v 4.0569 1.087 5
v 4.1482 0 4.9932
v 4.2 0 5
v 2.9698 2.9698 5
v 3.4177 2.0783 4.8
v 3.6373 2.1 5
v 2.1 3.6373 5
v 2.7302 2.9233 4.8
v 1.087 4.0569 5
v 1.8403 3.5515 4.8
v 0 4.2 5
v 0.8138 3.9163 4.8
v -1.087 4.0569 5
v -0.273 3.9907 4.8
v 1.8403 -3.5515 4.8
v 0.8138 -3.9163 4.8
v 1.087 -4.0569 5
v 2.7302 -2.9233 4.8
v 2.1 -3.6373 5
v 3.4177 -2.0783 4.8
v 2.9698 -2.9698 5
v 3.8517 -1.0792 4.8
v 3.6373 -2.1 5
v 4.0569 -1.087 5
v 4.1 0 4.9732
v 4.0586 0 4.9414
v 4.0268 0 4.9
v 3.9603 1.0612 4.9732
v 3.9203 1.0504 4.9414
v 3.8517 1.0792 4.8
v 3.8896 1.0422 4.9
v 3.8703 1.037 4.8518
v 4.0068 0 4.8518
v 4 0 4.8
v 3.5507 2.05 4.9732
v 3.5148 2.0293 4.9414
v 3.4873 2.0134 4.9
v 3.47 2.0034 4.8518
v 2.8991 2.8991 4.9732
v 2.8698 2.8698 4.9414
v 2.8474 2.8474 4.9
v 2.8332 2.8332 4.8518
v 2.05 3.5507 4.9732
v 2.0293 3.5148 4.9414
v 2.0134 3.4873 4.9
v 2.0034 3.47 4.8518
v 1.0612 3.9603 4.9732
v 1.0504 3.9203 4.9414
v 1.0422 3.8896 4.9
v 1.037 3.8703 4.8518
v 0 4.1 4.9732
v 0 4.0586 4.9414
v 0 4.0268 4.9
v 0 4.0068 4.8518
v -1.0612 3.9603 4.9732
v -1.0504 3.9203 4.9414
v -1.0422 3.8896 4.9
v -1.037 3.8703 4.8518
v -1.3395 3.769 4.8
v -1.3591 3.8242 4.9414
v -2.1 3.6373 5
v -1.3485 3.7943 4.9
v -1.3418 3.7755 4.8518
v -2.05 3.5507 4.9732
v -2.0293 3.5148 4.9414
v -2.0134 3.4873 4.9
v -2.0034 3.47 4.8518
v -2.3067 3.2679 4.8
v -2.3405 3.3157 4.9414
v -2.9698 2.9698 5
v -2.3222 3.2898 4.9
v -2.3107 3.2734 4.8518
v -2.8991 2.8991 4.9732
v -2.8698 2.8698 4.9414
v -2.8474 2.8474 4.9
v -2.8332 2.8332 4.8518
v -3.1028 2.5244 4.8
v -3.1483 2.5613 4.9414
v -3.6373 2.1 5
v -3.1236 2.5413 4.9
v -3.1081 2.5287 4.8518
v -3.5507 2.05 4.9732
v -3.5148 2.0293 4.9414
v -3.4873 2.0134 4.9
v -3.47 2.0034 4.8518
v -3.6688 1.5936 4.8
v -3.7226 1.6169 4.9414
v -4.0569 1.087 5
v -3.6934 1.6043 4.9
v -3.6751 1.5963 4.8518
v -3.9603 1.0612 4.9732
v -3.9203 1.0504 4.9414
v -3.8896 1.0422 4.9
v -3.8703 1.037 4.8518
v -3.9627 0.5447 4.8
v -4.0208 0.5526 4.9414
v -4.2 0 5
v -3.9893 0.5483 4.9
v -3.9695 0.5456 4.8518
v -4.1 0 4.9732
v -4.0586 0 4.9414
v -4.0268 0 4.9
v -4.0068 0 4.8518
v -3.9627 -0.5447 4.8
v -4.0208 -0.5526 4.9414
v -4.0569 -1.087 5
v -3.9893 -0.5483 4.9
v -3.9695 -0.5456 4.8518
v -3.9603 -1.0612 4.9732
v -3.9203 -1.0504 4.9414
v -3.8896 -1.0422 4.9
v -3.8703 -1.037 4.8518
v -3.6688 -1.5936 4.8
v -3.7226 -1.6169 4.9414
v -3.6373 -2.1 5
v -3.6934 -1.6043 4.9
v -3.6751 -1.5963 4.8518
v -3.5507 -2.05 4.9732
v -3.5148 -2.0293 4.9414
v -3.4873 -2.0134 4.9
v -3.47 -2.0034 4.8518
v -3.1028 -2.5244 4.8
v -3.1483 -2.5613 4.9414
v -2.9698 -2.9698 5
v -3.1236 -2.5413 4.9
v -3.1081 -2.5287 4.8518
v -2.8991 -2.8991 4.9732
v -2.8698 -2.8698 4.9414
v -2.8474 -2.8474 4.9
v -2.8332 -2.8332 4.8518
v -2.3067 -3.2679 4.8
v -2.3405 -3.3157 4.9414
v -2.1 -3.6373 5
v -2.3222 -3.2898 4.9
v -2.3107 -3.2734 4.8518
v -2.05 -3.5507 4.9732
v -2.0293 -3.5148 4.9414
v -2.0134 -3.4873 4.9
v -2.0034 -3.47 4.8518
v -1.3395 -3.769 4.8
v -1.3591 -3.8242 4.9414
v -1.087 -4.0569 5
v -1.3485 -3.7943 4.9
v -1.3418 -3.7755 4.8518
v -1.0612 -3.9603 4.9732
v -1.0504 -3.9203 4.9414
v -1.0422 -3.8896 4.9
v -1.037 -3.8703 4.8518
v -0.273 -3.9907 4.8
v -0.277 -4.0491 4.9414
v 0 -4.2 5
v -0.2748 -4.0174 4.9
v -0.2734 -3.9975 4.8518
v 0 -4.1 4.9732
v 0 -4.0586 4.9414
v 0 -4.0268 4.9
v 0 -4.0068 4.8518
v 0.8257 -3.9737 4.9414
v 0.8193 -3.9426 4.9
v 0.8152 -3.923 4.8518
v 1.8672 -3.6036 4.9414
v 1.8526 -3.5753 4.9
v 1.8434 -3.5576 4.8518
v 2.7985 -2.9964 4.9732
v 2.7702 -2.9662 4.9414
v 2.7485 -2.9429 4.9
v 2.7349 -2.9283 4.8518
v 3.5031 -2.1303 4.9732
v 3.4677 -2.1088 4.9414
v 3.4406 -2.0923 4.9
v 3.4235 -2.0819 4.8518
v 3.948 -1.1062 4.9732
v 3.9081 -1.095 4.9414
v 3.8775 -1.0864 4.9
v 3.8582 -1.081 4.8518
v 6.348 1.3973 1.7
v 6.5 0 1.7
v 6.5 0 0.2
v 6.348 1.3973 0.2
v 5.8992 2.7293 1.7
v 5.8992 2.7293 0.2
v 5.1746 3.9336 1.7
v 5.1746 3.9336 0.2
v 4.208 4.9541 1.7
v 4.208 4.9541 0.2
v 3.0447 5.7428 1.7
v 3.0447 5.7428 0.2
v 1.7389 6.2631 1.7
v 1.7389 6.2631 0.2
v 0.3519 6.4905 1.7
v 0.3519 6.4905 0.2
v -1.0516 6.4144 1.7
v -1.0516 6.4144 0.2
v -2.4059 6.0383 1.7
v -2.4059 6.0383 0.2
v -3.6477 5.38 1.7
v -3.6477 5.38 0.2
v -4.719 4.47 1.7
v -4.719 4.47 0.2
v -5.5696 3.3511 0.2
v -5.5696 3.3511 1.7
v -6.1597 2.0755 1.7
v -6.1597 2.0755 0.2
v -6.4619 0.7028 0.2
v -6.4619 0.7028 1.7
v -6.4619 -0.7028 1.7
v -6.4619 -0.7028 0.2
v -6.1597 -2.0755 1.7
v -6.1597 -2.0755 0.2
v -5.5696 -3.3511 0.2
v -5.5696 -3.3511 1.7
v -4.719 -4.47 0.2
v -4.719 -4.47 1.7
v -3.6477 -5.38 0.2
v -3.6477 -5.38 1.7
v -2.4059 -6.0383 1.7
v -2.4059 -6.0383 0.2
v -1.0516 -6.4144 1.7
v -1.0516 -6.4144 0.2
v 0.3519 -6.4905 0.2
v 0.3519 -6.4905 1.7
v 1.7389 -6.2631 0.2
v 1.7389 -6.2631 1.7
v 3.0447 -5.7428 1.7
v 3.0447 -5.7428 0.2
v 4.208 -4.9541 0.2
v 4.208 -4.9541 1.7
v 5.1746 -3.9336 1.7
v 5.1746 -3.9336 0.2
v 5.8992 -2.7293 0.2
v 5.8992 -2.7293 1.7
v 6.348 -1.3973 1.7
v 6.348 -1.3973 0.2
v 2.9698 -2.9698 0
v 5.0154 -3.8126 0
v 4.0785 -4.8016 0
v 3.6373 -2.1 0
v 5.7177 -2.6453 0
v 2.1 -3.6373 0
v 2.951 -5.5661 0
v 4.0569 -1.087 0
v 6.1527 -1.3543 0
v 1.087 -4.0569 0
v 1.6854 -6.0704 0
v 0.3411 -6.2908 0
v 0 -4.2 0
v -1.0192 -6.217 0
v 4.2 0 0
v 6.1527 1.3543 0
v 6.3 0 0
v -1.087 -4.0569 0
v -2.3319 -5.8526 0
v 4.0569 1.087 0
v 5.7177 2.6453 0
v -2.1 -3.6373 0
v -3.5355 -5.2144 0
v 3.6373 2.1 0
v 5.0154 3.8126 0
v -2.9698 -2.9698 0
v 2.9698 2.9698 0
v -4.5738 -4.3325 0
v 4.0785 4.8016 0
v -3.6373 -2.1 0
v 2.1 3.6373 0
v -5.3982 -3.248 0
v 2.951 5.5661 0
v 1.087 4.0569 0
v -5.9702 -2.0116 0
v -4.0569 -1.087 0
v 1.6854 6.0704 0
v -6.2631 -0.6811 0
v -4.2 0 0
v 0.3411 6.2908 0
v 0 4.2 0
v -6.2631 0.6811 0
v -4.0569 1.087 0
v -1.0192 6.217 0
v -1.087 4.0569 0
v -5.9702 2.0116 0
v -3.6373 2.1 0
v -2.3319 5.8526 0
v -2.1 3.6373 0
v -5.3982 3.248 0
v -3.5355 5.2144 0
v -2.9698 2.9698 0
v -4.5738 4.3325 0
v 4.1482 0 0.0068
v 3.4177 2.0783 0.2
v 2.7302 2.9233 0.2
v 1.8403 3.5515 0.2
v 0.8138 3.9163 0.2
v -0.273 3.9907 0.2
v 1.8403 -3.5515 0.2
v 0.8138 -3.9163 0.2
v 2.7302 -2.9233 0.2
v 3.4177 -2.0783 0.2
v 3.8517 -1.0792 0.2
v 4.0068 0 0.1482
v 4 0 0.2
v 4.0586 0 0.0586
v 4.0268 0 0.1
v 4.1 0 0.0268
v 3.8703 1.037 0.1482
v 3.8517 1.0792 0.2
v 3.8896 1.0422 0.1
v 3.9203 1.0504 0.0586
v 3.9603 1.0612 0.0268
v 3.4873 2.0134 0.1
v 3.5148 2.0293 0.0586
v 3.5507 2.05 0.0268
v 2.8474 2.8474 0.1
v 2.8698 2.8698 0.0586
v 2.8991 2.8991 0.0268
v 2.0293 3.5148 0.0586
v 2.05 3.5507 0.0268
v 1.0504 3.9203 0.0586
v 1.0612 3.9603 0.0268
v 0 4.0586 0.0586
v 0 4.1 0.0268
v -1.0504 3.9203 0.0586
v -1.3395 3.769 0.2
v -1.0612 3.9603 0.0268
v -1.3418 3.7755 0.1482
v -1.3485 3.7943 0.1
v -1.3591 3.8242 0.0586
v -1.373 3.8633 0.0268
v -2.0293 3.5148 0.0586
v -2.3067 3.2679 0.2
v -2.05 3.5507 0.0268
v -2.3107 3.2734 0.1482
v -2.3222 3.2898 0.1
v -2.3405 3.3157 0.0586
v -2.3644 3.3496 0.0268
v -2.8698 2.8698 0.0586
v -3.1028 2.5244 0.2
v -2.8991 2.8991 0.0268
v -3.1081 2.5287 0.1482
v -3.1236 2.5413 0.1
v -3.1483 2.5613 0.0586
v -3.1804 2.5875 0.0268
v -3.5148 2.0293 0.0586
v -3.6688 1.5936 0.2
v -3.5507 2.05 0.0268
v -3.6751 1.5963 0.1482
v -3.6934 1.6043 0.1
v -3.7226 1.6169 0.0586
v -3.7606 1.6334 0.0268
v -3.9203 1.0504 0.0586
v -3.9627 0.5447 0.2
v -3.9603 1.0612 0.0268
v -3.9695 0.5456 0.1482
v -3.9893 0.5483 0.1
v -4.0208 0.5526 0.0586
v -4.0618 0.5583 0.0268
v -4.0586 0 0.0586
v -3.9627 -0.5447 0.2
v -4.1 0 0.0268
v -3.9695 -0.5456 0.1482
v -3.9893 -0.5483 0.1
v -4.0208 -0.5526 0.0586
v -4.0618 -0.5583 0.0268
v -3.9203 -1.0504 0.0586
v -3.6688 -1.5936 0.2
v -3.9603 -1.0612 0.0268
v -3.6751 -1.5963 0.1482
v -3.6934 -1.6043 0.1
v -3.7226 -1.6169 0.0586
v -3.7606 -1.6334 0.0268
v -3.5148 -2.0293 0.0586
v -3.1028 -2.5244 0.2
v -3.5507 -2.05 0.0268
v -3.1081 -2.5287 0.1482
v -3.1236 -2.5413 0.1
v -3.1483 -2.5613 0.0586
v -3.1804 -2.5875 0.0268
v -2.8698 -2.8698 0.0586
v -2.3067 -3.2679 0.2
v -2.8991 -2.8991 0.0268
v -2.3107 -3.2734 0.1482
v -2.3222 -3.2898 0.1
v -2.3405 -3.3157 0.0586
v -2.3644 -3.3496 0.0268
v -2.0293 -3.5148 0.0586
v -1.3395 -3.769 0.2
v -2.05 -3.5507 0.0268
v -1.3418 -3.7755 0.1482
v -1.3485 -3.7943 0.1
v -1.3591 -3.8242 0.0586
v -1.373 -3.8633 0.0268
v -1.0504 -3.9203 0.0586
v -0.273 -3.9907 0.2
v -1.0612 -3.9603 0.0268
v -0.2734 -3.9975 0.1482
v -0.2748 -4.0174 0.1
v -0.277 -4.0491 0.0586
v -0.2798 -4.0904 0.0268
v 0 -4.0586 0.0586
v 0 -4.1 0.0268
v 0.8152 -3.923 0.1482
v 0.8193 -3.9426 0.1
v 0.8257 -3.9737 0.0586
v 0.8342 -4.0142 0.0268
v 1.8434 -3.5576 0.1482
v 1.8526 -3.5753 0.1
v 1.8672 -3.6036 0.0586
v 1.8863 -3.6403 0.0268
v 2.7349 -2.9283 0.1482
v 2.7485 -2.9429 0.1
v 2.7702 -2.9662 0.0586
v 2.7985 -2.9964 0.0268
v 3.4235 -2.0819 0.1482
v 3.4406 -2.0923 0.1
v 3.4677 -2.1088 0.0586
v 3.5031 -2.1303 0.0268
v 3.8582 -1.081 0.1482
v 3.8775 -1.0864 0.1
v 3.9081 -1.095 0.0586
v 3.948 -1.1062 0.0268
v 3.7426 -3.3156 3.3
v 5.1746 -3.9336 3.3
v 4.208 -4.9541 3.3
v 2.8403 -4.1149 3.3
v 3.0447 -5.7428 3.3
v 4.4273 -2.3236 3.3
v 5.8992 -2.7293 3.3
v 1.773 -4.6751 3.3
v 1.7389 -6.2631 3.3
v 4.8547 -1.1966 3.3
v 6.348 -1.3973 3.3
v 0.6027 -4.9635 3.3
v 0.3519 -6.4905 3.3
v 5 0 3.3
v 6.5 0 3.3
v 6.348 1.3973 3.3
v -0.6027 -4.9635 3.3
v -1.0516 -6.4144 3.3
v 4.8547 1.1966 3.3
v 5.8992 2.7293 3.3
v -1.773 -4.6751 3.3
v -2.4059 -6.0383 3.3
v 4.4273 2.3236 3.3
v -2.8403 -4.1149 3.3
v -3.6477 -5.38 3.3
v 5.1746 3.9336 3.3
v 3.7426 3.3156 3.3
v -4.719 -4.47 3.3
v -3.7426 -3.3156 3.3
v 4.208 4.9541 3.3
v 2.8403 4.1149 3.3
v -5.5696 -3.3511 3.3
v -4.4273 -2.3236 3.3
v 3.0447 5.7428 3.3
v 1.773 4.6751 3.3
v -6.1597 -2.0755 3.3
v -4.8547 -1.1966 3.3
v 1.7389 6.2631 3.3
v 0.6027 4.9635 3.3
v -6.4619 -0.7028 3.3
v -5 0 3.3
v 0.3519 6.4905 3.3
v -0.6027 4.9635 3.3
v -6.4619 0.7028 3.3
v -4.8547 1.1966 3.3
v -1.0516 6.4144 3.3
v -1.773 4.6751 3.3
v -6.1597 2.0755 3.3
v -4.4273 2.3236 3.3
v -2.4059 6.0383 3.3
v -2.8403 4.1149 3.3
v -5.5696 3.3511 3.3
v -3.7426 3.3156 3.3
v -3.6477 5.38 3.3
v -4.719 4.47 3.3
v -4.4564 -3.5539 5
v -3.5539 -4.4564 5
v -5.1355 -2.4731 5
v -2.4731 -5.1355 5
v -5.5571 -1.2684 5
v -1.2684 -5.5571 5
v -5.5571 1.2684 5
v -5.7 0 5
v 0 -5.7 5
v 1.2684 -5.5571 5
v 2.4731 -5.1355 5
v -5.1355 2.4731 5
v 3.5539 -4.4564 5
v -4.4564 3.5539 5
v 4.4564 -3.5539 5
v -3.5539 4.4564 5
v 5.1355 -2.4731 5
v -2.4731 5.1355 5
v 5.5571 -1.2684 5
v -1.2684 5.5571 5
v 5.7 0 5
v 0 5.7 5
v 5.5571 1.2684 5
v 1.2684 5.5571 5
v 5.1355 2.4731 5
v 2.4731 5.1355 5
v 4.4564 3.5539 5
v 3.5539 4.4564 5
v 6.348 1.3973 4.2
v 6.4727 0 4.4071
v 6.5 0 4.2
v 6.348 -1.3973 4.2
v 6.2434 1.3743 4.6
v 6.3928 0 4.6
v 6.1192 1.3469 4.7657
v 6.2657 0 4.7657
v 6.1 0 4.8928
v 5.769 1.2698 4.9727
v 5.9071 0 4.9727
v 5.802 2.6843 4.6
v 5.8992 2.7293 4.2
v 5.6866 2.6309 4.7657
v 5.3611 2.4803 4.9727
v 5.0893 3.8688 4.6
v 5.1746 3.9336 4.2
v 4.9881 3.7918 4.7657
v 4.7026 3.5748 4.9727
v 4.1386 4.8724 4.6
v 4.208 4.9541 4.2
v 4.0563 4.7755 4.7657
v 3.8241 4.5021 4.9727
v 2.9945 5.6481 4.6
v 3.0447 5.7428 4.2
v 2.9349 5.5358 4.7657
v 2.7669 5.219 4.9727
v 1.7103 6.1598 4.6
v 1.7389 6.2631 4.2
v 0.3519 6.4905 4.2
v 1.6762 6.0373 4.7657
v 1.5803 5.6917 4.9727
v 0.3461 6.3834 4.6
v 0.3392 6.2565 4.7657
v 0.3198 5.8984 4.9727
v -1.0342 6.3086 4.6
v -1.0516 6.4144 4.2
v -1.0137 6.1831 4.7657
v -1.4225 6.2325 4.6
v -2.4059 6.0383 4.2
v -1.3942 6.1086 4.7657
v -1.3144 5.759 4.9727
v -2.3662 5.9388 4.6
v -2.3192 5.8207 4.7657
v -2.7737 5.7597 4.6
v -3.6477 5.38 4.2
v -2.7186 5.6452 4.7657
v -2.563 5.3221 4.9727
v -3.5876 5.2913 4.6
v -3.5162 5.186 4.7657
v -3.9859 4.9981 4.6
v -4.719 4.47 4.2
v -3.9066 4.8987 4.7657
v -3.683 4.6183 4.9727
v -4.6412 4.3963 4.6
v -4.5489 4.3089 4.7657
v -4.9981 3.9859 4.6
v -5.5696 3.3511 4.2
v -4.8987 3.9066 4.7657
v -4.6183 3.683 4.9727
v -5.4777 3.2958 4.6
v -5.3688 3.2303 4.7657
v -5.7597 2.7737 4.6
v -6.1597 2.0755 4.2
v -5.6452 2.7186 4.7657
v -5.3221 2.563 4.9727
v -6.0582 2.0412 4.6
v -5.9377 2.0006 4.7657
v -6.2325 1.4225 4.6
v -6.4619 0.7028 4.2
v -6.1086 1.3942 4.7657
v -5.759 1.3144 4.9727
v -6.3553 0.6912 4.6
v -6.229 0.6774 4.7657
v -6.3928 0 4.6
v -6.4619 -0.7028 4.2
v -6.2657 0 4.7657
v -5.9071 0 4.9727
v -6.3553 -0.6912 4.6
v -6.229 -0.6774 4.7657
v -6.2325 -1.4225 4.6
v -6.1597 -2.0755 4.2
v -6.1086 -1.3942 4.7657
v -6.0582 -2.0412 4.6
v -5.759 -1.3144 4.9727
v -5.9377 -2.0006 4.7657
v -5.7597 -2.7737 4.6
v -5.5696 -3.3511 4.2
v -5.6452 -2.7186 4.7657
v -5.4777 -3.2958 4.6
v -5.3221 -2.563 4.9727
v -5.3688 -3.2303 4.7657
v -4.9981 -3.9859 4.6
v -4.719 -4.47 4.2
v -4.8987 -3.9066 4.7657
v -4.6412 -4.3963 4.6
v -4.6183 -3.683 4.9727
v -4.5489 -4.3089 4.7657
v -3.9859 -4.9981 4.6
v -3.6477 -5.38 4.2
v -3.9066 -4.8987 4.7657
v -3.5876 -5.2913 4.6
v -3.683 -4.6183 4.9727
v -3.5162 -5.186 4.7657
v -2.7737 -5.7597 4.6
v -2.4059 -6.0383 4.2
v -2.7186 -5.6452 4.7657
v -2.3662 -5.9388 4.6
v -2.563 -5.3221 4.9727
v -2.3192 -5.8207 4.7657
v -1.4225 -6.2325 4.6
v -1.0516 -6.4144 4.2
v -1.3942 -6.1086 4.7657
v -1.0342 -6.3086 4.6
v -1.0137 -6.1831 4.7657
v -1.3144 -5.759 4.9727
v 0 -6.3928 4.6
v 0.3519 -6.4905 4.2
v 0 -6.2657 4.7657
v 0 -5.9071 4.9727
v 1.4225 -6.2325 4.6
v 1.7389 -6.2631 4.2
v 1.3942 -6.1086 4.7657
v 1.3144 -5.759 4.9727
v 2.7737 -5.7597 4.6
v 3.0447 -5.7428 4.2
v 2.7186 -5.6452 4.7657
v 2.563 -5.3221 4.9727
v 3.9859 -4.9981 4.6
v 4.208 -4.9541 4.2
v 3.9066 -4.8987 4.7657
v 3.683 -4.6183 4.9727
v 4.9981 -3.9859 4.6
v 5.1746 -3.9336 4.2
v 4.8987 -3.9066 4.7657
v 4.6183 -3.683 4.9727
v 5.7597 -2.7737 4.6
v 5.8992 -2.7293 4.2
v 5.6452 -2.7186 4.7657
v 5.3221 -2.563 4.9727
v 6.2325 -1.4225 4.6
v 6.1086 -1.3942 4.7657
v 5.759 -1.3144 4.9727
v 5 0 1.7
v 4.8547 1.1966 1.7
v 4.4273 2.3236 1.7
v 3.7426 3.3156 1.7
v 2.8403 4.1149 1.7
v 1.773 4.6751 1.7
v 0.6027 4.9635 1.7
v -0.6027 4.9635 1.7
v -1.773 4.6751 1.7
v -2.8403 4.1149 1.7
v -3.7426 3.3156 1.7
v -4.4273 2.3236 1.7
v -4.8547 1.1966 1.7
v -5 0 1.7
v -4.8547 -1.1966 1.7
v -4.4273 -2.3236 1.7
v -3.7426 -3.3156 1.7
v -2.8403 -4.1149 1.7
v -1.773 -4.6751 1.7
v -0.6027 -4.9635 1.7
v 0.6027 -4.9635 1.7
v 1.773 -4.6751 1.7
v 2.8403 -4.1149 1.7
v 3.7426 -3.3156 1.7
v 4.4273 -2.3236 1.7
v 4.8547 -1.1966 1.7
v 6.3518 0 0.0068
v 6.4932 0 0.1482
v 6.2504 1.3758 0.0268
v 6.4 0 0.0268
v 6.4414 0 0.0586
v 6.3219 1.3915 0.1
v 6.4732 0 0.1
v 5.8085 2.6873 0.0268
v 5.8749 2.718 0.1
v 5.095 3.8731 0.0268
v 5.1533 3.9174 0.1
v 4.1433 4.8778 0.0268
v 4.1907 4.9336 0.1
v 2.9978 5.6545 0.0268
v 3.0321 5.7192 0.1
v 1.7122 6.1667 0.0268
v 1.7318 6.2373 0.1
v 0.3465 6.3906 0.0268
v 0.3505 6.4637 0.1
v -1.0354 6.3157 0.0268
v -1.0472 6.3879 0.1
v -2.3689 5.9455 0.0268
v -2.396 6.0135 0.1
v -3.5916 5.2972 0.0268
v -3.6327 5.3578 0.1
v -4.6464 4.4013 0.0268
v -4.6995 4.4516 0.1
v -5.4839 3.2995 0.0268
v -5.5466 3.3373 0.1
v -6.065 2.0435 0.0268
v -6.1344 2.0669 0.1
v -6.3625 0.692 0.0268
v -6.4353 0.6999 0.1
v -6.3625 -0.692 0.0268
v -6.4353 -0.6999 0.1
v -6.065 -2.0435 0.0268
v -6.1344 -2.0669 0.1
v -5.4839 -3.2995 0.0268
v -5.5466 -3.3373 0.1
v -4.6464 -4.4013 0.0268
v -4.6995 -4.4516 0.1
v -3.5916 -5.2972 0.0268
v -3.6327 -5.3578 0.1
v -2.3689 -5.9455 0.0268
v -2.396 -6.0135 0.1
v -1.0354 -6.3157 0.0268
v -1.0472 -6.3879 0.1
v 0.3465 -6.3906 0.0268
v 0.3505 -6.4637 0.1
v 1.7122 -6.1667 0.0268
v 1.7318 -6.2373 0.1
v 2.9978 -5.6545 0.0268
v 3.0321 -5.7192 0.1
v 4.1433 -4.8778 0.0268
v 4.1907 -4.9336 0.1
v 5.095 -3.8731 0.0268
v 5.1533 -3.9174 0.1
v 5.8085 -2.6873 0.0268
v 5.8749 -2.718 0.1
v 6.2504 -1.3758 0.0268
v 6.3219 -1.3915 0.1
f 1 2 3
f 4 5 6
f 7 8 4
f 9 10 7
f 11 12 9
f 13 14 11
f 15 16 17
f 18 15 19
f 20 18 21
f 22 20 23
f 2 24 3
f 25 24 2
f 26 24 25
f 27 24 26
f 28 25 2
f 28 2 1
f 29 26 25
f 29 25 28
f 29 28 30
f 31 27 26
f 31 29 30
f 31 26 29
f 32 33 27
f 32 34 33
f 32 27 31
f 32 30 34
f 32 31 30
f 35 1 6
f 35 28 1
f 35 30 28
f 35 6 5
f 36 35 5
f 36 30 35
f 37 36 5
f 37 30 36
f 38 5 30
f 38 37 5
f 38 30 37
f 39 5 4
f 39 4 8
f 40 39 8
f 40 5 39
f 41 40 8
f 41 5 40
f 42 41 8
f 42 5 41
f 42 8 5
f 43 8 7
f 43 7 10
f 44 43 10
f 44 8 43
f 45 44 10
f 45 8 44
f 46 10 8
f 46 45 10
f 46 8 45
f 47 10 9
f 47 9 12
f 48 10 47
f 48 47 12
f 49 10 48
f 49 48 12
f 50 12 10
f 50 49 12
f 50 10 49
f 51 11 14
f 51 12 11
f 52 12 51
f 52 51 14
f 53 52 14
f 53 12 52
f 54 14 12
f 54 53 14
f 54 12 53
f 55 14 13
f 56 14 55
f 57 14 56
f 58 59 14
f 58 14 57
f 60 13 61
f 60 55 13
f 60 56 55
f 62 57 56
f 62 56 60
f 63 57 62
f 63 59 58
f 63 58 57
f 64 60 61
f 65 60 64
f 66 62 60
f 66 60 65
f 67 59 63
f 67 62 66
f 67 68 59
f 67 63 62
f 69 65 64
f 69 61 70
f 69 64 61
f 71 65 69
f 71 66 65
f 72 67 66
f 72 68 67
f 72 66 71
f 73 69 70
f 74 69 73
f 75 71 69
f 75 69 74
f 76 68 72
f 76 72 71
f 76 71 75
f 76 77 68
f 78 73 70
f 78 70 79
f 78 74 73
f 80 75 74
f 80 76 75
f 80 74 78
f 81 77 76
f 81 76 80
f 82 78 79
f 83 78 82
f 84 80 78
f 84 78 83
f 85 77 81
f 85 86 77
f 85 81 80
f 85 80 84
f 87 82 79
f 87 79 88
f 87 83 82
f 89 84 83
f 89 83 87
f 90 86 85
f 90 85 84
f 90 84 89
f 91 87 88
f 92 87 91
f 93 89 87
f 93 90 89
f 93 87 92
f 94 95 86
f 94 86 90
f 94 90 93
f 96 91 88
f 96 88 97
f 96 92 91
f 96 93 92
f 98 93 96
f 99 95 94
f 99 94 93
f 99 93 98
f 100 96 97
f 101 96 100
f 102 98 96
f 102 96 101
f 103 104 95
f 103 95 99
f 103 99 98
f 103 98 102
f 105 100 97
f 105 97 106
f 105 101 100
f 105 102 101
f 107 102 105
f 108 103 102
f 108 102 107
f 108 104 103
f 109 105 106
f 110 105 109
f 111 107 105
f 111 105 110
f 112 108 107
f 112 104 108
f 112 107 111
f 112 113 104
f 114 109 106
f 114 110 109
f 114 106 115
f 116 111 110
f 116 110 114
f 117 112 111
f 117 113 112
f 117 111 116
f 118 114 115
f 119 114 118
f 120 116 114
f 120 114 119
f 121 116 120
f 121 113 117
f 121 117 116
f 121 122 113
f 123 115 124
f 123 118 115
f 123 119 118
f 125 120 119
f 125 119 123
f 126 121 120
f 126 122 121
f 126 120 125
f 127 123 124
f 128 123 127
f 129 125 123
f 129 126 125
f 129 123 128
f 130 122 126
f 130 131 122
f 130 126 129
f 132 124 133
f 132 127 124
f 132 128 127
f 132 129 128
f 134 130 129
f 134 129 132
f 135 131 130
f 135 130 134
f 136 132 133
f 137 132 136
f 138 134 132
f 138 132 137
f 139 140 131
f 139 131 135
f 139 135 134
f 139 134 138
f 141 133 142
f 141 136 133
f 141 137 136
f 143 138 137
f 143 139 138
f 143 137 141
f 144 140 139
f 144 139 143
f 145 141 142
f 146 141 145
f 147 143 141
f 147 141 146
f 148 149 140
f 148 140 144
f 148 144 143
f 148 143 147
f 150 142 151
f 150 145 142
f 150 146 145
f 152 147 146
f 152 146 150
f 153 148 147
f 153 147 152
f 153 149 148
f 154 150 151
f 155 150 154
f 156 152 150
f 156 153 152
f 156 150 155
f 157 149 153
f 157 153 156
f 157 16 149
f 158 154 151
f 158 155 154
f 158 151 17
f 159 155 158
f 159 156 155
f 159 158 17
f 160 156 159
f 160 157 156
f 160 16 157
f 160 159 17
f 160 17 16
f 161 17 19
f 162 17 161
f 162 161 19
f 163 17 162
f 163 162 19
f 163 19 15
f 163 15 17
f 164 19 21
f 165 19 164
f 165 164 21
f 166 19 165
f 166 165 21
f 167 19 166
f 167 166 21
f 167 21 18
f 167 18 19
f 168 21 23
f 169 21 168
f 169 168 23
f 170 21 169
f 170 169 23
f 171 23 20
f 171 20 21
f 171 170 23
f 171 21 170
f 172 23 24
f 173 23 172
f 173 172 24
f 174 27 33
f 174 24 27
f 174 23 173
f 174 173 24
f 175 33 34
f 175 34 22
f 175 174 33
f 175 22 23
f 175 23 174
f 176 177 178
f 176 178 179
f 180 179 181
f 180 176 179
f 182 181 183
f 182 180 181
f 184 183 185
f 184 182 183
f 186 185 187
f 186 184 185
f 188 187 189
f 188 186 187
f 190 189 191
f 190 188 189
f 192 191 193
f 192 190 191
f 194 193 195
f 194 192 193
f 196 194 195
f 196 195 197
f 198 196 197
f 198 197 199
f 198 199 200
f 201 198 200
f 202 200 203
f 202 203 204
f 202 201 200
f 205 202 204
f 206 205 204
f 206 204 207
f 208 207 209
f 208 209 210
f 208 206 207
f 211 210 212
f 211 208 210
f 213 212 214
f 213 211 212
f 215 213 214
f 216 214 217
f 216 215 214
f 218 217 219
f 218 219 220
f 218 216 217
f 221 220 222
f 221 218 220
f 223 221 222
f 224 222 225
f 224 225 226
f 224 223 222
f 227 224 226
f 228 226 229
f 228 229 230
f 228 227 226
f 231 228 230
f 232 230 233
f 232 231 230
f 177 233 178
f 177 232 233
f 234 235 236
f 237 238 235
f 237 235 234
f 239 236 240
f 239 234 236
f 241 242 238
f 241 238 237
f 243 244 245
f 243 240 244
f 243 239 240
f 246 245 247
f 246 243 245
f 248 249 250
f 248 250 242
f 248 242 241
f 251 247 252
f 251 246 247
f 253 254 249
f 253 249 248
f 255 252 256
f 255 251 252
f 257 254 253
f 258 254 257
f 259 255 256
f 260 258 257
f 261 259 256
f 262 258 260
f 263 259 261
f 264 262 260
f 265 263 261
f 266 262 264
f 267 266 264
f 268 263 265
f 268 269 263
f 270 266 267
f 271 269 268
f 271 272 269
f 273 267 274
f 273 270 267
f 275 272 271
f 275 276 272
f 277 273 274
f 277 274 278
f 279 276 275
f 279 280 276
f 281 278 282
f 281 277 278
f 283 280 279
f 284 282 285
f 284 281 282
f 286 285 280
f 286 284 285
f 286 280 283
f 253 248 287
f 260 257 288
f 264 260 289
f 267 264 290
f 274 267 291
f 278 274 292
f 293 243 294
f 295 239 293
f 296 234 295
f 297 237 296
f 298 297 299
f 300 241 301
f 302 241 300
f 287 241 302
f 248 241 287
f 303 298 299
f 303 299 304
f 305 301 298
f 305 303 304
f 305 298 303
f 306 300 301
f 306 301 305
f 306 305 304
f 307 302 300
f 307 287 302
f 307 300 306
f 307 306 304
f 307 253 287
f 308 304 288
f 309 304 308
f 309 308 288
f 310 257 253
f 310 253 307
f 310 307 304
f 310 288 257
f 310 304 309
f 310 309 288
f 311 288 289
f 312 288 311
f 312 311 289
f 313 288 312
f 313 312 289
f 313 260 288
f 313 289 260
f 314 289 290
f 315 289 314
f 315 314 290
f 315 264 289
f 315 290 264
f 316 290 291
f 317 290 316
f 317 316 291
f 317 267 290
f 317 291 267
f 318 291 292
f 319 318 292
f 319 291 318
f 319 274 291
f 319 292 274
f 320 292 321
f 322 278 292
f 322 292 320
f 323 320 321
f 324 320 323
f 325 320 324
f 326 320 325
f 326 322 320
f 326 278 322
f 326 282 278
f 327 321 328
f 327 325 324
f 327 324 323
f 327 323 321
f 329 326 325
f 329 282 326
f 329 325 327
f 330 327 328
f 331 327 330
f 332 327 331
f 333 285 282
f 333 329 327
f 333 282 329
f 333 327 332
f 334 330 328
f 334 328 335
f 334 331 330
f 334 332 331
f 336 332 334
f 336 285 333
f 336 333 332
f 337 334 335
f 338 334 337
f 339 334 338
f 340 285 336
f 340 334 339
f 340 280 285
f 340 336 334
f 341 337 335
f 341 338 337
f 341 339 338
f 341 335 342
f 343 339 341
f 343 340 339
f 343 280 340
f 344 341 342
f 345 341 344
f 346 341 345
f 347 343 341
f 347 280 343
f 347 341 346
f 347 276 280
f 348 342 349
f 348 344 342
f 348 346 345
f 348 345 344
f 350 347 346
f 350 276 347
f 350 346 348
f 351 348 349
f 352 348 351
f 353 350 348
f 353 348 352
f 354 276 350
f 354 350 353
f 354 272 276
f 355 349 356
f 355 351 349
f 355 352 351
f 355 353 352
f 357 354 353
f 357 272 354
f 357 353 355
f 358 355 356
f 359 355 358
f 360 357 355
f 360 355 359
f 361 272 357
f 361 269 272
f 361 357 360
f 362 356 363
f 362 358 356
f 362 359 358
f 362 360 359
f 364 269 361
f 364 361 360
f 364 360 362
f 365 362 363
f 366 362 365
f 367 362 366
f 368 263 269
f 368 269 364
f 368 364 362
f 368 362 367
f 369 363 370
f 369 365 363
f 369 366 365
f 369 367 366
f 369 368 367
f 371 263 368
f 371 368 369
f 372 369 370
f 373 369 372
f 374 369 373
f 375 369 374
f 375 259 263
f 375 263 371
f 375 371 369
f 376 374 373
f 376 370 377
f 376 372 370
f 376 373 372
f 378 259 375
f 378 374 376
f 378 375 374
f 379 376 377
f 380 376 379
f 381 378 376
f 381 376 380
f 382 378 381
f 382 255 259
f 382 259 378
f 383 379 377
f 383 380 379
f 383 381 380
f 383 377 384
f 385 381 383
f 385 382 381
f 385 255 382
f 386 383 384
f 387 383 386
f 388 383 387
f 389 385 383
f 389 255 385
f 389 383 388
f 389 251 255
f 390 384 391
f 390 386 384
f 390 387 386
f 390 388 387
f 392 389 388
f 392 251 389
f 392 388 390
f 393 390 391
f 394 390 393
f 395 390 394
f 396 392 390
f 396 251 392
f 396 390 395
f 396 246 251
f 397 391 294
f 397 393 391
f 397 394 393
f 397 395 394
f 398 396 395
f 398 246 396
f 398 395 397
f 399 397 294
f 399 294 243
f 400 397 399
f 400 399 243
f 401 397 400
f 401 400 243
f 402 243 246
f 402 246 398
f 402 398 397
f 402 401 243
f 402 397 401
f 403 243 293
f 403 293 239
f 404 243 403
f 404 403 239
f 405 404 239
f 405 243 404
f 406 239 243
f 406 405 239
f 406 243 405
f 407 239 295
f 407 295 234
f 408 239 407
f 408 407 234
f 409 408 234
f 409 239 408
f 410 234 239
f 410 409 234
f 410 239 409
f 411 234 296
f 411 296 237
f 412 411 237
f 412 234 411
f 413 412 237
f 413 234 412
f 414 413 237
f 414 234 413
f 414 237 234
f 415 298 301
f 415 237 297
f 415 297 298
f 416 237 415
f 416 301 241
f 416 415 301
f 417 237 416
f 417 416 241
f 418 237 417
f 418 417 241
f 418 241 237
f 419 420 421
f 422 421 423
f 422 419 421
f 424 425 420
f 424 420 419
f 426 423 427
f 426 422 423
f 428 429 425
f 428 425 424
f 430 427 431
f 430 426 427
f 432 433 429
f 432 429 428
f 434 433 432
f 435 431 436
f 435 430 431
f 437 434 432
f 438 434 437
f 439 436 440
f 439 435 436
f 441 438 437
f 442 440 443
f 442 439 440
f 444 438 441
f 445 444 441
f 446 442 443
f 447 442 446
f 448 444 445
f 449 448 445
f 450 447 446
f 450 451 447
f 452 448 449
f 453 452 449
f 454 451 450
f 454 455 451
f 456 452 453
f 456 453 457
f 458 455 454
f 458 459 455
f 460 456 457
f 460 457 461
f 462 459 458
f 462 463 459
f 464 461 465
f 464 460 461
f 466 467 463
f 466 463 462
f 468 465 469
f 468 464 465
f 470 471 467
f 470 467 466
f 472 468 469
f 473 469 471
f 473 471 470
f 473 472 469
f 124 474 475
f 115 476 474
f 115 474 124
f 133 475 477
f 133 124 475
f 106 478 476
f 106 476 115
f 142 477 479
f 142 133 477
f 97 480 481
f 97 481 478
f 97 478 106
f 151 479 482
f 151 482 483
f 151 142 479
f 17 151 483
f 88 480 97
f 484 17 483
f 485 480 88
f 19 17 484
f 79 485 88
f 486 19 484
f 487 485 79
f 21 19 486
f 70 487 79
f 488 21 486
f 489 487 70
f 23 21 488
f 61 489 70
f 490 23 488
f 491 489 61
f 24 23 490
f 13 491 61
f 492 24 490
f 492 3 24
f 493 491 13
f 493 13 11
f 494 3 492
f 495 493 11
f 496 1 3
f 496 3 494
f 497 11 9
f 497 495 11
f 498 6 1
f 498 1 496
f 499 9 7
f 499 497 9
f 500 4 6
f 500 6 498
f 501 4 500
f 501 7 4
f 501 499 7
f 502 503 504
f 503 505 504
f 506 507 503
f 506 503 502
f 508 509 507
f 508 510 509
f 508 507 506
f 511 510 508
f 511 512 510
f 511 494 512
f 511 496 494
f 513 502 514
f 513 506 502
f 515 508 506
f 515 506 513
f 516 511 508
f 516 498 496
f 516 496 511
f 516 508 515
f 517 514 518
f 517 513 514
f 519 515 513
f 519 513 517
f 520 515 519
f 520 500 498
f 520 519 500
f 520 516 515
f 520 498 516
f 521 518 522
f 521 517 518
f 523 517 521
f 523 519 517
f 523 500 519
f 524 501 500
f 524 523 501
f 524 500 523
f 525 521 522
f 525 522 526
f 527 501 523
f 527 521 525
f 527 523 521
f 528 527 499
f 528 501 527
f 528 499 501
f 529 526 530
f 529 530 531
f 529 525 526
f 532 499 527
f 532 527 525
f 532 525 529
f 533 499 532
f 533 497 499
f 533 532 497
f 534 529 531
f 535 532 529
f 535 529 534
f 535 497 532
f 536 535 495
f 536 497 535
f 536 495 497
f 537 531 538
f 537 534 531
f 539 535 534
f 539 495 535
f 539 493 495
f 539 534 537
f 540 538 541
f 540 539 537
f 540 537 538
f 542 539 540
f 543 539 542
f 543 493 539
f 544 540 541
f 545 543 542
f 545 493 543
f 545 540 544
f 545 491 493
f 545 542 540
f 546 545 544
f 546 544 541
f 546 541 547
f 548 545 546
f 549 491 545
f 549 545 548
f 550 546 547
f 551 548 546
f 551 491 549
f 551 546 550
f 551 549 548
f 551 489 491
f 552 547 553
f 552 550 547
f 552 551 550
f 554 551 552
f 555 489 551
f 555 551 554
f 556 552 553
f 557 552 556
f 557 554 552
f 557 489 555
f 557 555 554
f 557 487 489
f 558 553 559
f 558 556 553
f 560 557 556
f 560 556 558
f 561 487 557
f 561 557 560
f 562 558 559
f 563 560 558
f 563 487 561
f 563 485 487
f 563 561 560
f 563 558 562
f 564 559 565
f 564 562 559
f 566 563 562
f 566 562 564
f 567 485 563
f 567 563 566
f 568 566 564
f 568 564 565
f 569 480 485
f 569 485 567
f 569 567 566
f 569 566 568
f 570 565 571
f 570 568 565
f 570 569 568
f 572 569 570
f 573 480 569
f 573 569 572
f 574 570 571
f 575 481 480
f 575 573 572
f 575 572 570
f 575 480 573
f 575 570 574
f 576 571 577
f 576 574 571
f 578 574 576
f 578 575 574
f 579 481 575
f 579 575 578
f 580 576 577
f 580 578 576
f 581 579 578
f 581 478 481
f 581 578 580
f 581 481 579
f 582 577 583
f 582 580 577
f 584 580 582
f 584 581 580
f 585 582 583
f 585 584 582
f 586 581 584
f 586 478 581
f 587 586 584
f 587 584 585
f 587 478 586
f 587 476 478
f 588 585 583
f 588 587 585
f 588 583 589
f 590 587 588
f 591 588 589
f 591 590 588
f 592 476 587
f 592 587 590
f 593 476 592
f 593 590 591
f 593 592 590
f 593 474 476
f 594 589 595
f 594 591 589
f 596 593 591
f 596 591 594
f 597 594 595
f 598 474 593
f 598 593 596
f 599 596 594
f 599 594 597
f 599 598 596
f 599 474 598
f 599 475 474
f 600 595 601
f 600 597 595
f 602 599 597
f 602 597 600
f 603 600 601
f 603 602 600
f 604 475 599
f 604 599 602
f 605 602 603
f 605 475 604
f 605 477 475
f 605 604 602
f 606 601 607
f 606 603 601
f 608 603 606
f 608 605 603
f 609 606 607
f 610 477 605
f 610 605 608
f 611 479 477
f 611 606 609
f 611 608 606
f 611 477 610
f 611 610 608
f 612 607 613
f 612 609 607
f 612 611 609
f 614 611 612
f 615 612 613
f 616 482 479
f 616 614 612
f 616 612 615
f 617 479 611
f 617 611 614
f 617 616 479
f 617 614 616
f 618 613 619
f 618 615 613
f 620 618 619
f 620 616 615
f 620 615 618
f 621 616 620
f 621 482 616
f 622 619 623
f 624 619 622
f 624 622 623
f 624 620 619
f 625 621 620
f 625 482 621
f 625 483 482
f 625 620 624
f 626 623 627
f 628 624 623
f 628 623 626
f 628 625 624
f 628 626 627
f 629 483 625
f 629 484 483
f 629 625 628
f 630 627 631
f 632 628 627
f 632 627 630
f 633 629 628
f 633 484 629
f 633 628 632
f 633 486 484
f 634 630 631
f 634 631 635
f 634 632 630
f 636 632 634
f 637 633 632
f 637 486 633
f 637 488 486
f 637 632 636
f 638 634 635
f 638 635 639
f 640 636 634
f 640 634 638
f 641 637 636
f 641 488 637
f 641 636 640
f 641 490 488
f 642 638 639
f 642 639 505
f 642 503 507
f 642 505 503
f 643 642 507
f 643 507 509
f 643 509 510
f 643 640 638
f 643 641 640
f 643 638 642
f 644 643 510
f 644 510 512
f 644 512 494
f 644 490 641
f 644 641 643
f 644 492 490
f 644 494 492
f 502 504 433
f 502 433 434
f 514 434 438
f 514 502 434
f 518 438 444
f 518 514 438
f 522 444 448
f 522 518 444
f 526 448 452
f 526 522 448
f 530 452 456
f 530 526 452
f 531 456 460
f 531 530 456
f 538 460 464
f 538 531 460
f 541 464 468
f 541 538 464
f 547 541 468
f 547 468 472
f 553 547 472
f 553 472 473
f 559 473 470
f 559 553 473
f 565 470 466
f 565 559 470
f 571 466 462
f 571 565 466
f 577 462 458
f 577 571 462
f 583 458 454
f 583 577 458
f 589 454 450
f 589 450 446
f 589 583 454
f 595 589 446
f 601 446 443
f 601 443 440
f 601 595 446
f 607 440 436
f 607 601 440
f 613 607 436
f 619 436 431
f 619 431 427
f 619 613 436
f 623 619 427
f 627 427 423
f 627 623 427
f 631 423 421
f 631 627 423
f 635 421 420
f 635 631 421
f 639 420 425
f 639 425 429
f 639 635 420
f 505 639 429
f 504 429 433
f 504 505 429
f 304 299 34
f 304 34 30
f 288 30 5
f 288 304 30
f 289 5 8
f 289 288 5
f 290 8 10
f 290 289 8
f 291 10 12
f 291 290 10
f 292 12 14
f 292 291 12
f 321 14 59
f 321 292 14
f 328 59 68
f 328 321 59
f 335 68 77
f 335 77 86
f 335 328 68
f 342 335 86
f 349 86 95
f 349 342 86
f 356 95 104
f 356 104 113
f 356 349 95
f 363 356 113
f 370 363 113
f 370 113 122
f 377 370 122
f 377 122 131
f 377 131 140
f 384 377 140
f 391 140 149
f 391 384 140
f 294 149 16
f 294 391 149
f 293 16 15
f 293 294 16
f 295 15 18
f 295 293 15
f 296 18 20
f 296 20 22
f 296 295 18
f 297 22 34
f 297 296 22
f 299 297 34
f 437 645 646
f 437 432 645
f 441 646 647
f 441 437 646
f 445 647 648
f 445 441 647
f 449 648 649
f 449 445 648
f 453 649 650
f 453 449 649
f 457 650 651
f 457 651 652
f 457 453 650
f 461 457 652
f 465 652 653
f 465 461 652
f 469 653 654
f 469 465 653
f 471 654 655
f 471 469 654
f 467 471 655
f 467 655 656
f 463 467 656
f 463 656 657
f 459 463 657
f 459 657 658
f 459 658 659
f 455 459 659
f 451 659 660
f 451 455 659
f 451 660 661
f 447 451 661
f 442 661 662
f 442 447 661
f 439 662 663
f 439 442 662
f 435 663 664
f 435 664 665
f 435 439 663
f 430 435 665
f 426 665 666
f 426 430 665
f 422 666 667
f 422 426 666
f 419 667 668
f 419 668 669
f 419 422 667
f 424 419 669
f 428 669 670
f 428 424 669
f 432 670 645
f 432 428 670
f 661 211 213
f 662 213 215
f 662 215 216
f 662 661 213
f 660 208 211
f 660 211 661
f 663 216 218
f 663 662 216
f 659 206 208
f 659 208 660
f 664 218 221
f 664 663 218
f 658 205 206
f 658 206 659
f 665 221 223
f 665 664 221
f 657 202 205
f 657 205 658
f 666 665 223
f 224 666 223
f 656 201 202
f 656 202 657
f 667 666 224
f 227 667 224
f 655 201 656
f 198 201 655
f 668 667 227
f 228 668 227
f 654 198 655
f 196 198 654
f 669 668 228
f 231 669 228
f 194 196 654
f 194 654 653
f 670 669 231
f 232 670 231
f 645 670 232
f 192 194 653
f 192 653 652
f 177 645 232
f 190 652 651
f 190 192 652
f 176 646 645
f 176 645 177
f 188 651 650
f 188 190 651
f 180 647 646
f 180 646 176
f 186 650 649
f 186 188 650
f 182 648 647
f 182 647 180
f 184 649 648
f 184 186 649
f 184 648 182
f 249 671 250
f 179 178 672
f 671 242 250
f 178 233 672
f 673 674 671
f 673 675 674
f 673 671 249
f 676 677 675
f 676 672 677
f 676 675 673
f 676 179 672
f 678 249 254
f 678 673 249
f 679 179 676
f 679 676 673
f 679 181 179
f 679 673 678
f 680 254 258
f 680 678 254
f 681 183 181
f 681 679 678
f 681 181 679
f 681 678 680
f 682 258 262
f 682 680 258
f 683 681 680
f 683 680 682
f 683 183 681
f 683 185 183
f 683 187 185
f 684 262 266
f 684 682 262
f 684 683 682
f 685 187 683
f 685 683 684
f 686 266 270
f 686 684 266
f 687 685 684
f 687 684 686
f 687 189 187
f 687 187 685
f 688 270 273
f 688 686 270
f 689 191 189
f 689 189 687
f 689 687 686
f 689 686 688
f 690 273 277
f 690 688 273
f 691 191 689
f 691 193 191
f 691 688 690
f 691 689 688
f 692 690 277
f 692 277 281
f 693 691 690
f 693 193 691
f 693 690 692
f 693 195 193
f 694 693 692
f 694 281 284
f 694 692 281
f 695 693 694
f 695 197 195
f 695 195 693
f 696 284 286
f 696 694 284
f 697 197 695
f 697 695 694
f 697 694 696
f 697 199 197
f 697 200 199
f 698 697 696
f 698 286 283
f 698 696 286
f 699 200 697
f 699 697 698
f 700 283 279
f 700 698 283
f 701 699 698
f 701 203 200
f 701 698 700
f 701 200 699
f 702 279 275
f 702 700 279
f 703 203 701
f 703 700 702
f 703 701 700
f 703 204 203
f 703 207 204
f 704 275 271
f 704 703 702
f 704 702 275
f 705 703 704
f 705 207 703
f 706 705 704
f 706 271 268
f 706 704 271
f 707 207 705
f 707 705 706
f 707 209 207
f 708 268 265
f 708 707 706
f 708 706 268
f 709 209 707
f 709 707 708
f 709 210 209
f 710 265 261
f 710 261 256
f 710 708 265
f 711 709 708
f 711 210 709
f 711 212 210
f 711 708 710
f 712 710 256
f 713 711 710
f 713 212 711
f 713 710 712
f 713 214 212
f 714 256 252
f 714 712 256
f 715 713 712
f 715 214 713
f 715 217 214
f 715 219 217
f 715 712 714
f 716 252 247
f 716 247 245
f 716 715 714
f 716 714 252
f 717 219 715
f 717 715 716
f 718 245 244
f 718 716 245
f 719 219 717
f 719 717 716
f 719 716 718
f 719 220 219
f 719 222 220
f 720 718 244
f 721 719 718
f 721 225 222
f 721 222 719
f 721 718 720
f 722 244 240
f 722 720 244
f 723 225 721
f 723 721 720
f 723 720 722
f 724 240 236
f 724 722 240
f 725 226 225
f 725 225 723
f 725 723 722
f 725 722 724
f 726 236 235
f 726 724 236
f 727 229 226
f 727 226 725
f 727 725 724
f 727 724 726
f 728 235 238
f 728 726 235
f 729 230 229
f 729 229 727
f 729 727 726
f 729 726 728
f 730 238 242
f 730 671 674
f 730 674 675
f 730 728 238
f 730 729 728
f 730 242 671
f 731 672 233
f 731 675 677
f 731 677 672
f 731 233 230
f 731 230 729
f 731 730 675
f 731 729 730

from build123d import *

# Parameters (mm, degrees)
F2_R = 0.8
F3_R = 0.2


with BuildPart() as f1:
    # F0 (on Front) → F1 (revolve)
    with BuildSketch(Plane.XZ):
        Polygon((4, 5), (4, 0), (6.5, 0), (6.5, 1.7), (5, 1.7), (5, 3.3), (6.5, 3.3), (6.5, 5), align=None)
    revolve(axis=Axis((0, 0, 3.666565), (0, 0, 1)))

    # F2
    f2_edges = [f1.edges().sort_by_distance(p)[0] for p in [
        (-6.5, 0, 5),
    ]]
    fillet(f2_edges, radius=F2_R)

    # F3
    f3_edges = [f1.edges().sort_by_distance(p)[0] for p in [
        (-4, 0, 5),
        (-4, 0, 0),
        (-6.5, 0, 0),
    ]]
    fillet(f3_edges, radius=F3_R)


solid = f1.part
